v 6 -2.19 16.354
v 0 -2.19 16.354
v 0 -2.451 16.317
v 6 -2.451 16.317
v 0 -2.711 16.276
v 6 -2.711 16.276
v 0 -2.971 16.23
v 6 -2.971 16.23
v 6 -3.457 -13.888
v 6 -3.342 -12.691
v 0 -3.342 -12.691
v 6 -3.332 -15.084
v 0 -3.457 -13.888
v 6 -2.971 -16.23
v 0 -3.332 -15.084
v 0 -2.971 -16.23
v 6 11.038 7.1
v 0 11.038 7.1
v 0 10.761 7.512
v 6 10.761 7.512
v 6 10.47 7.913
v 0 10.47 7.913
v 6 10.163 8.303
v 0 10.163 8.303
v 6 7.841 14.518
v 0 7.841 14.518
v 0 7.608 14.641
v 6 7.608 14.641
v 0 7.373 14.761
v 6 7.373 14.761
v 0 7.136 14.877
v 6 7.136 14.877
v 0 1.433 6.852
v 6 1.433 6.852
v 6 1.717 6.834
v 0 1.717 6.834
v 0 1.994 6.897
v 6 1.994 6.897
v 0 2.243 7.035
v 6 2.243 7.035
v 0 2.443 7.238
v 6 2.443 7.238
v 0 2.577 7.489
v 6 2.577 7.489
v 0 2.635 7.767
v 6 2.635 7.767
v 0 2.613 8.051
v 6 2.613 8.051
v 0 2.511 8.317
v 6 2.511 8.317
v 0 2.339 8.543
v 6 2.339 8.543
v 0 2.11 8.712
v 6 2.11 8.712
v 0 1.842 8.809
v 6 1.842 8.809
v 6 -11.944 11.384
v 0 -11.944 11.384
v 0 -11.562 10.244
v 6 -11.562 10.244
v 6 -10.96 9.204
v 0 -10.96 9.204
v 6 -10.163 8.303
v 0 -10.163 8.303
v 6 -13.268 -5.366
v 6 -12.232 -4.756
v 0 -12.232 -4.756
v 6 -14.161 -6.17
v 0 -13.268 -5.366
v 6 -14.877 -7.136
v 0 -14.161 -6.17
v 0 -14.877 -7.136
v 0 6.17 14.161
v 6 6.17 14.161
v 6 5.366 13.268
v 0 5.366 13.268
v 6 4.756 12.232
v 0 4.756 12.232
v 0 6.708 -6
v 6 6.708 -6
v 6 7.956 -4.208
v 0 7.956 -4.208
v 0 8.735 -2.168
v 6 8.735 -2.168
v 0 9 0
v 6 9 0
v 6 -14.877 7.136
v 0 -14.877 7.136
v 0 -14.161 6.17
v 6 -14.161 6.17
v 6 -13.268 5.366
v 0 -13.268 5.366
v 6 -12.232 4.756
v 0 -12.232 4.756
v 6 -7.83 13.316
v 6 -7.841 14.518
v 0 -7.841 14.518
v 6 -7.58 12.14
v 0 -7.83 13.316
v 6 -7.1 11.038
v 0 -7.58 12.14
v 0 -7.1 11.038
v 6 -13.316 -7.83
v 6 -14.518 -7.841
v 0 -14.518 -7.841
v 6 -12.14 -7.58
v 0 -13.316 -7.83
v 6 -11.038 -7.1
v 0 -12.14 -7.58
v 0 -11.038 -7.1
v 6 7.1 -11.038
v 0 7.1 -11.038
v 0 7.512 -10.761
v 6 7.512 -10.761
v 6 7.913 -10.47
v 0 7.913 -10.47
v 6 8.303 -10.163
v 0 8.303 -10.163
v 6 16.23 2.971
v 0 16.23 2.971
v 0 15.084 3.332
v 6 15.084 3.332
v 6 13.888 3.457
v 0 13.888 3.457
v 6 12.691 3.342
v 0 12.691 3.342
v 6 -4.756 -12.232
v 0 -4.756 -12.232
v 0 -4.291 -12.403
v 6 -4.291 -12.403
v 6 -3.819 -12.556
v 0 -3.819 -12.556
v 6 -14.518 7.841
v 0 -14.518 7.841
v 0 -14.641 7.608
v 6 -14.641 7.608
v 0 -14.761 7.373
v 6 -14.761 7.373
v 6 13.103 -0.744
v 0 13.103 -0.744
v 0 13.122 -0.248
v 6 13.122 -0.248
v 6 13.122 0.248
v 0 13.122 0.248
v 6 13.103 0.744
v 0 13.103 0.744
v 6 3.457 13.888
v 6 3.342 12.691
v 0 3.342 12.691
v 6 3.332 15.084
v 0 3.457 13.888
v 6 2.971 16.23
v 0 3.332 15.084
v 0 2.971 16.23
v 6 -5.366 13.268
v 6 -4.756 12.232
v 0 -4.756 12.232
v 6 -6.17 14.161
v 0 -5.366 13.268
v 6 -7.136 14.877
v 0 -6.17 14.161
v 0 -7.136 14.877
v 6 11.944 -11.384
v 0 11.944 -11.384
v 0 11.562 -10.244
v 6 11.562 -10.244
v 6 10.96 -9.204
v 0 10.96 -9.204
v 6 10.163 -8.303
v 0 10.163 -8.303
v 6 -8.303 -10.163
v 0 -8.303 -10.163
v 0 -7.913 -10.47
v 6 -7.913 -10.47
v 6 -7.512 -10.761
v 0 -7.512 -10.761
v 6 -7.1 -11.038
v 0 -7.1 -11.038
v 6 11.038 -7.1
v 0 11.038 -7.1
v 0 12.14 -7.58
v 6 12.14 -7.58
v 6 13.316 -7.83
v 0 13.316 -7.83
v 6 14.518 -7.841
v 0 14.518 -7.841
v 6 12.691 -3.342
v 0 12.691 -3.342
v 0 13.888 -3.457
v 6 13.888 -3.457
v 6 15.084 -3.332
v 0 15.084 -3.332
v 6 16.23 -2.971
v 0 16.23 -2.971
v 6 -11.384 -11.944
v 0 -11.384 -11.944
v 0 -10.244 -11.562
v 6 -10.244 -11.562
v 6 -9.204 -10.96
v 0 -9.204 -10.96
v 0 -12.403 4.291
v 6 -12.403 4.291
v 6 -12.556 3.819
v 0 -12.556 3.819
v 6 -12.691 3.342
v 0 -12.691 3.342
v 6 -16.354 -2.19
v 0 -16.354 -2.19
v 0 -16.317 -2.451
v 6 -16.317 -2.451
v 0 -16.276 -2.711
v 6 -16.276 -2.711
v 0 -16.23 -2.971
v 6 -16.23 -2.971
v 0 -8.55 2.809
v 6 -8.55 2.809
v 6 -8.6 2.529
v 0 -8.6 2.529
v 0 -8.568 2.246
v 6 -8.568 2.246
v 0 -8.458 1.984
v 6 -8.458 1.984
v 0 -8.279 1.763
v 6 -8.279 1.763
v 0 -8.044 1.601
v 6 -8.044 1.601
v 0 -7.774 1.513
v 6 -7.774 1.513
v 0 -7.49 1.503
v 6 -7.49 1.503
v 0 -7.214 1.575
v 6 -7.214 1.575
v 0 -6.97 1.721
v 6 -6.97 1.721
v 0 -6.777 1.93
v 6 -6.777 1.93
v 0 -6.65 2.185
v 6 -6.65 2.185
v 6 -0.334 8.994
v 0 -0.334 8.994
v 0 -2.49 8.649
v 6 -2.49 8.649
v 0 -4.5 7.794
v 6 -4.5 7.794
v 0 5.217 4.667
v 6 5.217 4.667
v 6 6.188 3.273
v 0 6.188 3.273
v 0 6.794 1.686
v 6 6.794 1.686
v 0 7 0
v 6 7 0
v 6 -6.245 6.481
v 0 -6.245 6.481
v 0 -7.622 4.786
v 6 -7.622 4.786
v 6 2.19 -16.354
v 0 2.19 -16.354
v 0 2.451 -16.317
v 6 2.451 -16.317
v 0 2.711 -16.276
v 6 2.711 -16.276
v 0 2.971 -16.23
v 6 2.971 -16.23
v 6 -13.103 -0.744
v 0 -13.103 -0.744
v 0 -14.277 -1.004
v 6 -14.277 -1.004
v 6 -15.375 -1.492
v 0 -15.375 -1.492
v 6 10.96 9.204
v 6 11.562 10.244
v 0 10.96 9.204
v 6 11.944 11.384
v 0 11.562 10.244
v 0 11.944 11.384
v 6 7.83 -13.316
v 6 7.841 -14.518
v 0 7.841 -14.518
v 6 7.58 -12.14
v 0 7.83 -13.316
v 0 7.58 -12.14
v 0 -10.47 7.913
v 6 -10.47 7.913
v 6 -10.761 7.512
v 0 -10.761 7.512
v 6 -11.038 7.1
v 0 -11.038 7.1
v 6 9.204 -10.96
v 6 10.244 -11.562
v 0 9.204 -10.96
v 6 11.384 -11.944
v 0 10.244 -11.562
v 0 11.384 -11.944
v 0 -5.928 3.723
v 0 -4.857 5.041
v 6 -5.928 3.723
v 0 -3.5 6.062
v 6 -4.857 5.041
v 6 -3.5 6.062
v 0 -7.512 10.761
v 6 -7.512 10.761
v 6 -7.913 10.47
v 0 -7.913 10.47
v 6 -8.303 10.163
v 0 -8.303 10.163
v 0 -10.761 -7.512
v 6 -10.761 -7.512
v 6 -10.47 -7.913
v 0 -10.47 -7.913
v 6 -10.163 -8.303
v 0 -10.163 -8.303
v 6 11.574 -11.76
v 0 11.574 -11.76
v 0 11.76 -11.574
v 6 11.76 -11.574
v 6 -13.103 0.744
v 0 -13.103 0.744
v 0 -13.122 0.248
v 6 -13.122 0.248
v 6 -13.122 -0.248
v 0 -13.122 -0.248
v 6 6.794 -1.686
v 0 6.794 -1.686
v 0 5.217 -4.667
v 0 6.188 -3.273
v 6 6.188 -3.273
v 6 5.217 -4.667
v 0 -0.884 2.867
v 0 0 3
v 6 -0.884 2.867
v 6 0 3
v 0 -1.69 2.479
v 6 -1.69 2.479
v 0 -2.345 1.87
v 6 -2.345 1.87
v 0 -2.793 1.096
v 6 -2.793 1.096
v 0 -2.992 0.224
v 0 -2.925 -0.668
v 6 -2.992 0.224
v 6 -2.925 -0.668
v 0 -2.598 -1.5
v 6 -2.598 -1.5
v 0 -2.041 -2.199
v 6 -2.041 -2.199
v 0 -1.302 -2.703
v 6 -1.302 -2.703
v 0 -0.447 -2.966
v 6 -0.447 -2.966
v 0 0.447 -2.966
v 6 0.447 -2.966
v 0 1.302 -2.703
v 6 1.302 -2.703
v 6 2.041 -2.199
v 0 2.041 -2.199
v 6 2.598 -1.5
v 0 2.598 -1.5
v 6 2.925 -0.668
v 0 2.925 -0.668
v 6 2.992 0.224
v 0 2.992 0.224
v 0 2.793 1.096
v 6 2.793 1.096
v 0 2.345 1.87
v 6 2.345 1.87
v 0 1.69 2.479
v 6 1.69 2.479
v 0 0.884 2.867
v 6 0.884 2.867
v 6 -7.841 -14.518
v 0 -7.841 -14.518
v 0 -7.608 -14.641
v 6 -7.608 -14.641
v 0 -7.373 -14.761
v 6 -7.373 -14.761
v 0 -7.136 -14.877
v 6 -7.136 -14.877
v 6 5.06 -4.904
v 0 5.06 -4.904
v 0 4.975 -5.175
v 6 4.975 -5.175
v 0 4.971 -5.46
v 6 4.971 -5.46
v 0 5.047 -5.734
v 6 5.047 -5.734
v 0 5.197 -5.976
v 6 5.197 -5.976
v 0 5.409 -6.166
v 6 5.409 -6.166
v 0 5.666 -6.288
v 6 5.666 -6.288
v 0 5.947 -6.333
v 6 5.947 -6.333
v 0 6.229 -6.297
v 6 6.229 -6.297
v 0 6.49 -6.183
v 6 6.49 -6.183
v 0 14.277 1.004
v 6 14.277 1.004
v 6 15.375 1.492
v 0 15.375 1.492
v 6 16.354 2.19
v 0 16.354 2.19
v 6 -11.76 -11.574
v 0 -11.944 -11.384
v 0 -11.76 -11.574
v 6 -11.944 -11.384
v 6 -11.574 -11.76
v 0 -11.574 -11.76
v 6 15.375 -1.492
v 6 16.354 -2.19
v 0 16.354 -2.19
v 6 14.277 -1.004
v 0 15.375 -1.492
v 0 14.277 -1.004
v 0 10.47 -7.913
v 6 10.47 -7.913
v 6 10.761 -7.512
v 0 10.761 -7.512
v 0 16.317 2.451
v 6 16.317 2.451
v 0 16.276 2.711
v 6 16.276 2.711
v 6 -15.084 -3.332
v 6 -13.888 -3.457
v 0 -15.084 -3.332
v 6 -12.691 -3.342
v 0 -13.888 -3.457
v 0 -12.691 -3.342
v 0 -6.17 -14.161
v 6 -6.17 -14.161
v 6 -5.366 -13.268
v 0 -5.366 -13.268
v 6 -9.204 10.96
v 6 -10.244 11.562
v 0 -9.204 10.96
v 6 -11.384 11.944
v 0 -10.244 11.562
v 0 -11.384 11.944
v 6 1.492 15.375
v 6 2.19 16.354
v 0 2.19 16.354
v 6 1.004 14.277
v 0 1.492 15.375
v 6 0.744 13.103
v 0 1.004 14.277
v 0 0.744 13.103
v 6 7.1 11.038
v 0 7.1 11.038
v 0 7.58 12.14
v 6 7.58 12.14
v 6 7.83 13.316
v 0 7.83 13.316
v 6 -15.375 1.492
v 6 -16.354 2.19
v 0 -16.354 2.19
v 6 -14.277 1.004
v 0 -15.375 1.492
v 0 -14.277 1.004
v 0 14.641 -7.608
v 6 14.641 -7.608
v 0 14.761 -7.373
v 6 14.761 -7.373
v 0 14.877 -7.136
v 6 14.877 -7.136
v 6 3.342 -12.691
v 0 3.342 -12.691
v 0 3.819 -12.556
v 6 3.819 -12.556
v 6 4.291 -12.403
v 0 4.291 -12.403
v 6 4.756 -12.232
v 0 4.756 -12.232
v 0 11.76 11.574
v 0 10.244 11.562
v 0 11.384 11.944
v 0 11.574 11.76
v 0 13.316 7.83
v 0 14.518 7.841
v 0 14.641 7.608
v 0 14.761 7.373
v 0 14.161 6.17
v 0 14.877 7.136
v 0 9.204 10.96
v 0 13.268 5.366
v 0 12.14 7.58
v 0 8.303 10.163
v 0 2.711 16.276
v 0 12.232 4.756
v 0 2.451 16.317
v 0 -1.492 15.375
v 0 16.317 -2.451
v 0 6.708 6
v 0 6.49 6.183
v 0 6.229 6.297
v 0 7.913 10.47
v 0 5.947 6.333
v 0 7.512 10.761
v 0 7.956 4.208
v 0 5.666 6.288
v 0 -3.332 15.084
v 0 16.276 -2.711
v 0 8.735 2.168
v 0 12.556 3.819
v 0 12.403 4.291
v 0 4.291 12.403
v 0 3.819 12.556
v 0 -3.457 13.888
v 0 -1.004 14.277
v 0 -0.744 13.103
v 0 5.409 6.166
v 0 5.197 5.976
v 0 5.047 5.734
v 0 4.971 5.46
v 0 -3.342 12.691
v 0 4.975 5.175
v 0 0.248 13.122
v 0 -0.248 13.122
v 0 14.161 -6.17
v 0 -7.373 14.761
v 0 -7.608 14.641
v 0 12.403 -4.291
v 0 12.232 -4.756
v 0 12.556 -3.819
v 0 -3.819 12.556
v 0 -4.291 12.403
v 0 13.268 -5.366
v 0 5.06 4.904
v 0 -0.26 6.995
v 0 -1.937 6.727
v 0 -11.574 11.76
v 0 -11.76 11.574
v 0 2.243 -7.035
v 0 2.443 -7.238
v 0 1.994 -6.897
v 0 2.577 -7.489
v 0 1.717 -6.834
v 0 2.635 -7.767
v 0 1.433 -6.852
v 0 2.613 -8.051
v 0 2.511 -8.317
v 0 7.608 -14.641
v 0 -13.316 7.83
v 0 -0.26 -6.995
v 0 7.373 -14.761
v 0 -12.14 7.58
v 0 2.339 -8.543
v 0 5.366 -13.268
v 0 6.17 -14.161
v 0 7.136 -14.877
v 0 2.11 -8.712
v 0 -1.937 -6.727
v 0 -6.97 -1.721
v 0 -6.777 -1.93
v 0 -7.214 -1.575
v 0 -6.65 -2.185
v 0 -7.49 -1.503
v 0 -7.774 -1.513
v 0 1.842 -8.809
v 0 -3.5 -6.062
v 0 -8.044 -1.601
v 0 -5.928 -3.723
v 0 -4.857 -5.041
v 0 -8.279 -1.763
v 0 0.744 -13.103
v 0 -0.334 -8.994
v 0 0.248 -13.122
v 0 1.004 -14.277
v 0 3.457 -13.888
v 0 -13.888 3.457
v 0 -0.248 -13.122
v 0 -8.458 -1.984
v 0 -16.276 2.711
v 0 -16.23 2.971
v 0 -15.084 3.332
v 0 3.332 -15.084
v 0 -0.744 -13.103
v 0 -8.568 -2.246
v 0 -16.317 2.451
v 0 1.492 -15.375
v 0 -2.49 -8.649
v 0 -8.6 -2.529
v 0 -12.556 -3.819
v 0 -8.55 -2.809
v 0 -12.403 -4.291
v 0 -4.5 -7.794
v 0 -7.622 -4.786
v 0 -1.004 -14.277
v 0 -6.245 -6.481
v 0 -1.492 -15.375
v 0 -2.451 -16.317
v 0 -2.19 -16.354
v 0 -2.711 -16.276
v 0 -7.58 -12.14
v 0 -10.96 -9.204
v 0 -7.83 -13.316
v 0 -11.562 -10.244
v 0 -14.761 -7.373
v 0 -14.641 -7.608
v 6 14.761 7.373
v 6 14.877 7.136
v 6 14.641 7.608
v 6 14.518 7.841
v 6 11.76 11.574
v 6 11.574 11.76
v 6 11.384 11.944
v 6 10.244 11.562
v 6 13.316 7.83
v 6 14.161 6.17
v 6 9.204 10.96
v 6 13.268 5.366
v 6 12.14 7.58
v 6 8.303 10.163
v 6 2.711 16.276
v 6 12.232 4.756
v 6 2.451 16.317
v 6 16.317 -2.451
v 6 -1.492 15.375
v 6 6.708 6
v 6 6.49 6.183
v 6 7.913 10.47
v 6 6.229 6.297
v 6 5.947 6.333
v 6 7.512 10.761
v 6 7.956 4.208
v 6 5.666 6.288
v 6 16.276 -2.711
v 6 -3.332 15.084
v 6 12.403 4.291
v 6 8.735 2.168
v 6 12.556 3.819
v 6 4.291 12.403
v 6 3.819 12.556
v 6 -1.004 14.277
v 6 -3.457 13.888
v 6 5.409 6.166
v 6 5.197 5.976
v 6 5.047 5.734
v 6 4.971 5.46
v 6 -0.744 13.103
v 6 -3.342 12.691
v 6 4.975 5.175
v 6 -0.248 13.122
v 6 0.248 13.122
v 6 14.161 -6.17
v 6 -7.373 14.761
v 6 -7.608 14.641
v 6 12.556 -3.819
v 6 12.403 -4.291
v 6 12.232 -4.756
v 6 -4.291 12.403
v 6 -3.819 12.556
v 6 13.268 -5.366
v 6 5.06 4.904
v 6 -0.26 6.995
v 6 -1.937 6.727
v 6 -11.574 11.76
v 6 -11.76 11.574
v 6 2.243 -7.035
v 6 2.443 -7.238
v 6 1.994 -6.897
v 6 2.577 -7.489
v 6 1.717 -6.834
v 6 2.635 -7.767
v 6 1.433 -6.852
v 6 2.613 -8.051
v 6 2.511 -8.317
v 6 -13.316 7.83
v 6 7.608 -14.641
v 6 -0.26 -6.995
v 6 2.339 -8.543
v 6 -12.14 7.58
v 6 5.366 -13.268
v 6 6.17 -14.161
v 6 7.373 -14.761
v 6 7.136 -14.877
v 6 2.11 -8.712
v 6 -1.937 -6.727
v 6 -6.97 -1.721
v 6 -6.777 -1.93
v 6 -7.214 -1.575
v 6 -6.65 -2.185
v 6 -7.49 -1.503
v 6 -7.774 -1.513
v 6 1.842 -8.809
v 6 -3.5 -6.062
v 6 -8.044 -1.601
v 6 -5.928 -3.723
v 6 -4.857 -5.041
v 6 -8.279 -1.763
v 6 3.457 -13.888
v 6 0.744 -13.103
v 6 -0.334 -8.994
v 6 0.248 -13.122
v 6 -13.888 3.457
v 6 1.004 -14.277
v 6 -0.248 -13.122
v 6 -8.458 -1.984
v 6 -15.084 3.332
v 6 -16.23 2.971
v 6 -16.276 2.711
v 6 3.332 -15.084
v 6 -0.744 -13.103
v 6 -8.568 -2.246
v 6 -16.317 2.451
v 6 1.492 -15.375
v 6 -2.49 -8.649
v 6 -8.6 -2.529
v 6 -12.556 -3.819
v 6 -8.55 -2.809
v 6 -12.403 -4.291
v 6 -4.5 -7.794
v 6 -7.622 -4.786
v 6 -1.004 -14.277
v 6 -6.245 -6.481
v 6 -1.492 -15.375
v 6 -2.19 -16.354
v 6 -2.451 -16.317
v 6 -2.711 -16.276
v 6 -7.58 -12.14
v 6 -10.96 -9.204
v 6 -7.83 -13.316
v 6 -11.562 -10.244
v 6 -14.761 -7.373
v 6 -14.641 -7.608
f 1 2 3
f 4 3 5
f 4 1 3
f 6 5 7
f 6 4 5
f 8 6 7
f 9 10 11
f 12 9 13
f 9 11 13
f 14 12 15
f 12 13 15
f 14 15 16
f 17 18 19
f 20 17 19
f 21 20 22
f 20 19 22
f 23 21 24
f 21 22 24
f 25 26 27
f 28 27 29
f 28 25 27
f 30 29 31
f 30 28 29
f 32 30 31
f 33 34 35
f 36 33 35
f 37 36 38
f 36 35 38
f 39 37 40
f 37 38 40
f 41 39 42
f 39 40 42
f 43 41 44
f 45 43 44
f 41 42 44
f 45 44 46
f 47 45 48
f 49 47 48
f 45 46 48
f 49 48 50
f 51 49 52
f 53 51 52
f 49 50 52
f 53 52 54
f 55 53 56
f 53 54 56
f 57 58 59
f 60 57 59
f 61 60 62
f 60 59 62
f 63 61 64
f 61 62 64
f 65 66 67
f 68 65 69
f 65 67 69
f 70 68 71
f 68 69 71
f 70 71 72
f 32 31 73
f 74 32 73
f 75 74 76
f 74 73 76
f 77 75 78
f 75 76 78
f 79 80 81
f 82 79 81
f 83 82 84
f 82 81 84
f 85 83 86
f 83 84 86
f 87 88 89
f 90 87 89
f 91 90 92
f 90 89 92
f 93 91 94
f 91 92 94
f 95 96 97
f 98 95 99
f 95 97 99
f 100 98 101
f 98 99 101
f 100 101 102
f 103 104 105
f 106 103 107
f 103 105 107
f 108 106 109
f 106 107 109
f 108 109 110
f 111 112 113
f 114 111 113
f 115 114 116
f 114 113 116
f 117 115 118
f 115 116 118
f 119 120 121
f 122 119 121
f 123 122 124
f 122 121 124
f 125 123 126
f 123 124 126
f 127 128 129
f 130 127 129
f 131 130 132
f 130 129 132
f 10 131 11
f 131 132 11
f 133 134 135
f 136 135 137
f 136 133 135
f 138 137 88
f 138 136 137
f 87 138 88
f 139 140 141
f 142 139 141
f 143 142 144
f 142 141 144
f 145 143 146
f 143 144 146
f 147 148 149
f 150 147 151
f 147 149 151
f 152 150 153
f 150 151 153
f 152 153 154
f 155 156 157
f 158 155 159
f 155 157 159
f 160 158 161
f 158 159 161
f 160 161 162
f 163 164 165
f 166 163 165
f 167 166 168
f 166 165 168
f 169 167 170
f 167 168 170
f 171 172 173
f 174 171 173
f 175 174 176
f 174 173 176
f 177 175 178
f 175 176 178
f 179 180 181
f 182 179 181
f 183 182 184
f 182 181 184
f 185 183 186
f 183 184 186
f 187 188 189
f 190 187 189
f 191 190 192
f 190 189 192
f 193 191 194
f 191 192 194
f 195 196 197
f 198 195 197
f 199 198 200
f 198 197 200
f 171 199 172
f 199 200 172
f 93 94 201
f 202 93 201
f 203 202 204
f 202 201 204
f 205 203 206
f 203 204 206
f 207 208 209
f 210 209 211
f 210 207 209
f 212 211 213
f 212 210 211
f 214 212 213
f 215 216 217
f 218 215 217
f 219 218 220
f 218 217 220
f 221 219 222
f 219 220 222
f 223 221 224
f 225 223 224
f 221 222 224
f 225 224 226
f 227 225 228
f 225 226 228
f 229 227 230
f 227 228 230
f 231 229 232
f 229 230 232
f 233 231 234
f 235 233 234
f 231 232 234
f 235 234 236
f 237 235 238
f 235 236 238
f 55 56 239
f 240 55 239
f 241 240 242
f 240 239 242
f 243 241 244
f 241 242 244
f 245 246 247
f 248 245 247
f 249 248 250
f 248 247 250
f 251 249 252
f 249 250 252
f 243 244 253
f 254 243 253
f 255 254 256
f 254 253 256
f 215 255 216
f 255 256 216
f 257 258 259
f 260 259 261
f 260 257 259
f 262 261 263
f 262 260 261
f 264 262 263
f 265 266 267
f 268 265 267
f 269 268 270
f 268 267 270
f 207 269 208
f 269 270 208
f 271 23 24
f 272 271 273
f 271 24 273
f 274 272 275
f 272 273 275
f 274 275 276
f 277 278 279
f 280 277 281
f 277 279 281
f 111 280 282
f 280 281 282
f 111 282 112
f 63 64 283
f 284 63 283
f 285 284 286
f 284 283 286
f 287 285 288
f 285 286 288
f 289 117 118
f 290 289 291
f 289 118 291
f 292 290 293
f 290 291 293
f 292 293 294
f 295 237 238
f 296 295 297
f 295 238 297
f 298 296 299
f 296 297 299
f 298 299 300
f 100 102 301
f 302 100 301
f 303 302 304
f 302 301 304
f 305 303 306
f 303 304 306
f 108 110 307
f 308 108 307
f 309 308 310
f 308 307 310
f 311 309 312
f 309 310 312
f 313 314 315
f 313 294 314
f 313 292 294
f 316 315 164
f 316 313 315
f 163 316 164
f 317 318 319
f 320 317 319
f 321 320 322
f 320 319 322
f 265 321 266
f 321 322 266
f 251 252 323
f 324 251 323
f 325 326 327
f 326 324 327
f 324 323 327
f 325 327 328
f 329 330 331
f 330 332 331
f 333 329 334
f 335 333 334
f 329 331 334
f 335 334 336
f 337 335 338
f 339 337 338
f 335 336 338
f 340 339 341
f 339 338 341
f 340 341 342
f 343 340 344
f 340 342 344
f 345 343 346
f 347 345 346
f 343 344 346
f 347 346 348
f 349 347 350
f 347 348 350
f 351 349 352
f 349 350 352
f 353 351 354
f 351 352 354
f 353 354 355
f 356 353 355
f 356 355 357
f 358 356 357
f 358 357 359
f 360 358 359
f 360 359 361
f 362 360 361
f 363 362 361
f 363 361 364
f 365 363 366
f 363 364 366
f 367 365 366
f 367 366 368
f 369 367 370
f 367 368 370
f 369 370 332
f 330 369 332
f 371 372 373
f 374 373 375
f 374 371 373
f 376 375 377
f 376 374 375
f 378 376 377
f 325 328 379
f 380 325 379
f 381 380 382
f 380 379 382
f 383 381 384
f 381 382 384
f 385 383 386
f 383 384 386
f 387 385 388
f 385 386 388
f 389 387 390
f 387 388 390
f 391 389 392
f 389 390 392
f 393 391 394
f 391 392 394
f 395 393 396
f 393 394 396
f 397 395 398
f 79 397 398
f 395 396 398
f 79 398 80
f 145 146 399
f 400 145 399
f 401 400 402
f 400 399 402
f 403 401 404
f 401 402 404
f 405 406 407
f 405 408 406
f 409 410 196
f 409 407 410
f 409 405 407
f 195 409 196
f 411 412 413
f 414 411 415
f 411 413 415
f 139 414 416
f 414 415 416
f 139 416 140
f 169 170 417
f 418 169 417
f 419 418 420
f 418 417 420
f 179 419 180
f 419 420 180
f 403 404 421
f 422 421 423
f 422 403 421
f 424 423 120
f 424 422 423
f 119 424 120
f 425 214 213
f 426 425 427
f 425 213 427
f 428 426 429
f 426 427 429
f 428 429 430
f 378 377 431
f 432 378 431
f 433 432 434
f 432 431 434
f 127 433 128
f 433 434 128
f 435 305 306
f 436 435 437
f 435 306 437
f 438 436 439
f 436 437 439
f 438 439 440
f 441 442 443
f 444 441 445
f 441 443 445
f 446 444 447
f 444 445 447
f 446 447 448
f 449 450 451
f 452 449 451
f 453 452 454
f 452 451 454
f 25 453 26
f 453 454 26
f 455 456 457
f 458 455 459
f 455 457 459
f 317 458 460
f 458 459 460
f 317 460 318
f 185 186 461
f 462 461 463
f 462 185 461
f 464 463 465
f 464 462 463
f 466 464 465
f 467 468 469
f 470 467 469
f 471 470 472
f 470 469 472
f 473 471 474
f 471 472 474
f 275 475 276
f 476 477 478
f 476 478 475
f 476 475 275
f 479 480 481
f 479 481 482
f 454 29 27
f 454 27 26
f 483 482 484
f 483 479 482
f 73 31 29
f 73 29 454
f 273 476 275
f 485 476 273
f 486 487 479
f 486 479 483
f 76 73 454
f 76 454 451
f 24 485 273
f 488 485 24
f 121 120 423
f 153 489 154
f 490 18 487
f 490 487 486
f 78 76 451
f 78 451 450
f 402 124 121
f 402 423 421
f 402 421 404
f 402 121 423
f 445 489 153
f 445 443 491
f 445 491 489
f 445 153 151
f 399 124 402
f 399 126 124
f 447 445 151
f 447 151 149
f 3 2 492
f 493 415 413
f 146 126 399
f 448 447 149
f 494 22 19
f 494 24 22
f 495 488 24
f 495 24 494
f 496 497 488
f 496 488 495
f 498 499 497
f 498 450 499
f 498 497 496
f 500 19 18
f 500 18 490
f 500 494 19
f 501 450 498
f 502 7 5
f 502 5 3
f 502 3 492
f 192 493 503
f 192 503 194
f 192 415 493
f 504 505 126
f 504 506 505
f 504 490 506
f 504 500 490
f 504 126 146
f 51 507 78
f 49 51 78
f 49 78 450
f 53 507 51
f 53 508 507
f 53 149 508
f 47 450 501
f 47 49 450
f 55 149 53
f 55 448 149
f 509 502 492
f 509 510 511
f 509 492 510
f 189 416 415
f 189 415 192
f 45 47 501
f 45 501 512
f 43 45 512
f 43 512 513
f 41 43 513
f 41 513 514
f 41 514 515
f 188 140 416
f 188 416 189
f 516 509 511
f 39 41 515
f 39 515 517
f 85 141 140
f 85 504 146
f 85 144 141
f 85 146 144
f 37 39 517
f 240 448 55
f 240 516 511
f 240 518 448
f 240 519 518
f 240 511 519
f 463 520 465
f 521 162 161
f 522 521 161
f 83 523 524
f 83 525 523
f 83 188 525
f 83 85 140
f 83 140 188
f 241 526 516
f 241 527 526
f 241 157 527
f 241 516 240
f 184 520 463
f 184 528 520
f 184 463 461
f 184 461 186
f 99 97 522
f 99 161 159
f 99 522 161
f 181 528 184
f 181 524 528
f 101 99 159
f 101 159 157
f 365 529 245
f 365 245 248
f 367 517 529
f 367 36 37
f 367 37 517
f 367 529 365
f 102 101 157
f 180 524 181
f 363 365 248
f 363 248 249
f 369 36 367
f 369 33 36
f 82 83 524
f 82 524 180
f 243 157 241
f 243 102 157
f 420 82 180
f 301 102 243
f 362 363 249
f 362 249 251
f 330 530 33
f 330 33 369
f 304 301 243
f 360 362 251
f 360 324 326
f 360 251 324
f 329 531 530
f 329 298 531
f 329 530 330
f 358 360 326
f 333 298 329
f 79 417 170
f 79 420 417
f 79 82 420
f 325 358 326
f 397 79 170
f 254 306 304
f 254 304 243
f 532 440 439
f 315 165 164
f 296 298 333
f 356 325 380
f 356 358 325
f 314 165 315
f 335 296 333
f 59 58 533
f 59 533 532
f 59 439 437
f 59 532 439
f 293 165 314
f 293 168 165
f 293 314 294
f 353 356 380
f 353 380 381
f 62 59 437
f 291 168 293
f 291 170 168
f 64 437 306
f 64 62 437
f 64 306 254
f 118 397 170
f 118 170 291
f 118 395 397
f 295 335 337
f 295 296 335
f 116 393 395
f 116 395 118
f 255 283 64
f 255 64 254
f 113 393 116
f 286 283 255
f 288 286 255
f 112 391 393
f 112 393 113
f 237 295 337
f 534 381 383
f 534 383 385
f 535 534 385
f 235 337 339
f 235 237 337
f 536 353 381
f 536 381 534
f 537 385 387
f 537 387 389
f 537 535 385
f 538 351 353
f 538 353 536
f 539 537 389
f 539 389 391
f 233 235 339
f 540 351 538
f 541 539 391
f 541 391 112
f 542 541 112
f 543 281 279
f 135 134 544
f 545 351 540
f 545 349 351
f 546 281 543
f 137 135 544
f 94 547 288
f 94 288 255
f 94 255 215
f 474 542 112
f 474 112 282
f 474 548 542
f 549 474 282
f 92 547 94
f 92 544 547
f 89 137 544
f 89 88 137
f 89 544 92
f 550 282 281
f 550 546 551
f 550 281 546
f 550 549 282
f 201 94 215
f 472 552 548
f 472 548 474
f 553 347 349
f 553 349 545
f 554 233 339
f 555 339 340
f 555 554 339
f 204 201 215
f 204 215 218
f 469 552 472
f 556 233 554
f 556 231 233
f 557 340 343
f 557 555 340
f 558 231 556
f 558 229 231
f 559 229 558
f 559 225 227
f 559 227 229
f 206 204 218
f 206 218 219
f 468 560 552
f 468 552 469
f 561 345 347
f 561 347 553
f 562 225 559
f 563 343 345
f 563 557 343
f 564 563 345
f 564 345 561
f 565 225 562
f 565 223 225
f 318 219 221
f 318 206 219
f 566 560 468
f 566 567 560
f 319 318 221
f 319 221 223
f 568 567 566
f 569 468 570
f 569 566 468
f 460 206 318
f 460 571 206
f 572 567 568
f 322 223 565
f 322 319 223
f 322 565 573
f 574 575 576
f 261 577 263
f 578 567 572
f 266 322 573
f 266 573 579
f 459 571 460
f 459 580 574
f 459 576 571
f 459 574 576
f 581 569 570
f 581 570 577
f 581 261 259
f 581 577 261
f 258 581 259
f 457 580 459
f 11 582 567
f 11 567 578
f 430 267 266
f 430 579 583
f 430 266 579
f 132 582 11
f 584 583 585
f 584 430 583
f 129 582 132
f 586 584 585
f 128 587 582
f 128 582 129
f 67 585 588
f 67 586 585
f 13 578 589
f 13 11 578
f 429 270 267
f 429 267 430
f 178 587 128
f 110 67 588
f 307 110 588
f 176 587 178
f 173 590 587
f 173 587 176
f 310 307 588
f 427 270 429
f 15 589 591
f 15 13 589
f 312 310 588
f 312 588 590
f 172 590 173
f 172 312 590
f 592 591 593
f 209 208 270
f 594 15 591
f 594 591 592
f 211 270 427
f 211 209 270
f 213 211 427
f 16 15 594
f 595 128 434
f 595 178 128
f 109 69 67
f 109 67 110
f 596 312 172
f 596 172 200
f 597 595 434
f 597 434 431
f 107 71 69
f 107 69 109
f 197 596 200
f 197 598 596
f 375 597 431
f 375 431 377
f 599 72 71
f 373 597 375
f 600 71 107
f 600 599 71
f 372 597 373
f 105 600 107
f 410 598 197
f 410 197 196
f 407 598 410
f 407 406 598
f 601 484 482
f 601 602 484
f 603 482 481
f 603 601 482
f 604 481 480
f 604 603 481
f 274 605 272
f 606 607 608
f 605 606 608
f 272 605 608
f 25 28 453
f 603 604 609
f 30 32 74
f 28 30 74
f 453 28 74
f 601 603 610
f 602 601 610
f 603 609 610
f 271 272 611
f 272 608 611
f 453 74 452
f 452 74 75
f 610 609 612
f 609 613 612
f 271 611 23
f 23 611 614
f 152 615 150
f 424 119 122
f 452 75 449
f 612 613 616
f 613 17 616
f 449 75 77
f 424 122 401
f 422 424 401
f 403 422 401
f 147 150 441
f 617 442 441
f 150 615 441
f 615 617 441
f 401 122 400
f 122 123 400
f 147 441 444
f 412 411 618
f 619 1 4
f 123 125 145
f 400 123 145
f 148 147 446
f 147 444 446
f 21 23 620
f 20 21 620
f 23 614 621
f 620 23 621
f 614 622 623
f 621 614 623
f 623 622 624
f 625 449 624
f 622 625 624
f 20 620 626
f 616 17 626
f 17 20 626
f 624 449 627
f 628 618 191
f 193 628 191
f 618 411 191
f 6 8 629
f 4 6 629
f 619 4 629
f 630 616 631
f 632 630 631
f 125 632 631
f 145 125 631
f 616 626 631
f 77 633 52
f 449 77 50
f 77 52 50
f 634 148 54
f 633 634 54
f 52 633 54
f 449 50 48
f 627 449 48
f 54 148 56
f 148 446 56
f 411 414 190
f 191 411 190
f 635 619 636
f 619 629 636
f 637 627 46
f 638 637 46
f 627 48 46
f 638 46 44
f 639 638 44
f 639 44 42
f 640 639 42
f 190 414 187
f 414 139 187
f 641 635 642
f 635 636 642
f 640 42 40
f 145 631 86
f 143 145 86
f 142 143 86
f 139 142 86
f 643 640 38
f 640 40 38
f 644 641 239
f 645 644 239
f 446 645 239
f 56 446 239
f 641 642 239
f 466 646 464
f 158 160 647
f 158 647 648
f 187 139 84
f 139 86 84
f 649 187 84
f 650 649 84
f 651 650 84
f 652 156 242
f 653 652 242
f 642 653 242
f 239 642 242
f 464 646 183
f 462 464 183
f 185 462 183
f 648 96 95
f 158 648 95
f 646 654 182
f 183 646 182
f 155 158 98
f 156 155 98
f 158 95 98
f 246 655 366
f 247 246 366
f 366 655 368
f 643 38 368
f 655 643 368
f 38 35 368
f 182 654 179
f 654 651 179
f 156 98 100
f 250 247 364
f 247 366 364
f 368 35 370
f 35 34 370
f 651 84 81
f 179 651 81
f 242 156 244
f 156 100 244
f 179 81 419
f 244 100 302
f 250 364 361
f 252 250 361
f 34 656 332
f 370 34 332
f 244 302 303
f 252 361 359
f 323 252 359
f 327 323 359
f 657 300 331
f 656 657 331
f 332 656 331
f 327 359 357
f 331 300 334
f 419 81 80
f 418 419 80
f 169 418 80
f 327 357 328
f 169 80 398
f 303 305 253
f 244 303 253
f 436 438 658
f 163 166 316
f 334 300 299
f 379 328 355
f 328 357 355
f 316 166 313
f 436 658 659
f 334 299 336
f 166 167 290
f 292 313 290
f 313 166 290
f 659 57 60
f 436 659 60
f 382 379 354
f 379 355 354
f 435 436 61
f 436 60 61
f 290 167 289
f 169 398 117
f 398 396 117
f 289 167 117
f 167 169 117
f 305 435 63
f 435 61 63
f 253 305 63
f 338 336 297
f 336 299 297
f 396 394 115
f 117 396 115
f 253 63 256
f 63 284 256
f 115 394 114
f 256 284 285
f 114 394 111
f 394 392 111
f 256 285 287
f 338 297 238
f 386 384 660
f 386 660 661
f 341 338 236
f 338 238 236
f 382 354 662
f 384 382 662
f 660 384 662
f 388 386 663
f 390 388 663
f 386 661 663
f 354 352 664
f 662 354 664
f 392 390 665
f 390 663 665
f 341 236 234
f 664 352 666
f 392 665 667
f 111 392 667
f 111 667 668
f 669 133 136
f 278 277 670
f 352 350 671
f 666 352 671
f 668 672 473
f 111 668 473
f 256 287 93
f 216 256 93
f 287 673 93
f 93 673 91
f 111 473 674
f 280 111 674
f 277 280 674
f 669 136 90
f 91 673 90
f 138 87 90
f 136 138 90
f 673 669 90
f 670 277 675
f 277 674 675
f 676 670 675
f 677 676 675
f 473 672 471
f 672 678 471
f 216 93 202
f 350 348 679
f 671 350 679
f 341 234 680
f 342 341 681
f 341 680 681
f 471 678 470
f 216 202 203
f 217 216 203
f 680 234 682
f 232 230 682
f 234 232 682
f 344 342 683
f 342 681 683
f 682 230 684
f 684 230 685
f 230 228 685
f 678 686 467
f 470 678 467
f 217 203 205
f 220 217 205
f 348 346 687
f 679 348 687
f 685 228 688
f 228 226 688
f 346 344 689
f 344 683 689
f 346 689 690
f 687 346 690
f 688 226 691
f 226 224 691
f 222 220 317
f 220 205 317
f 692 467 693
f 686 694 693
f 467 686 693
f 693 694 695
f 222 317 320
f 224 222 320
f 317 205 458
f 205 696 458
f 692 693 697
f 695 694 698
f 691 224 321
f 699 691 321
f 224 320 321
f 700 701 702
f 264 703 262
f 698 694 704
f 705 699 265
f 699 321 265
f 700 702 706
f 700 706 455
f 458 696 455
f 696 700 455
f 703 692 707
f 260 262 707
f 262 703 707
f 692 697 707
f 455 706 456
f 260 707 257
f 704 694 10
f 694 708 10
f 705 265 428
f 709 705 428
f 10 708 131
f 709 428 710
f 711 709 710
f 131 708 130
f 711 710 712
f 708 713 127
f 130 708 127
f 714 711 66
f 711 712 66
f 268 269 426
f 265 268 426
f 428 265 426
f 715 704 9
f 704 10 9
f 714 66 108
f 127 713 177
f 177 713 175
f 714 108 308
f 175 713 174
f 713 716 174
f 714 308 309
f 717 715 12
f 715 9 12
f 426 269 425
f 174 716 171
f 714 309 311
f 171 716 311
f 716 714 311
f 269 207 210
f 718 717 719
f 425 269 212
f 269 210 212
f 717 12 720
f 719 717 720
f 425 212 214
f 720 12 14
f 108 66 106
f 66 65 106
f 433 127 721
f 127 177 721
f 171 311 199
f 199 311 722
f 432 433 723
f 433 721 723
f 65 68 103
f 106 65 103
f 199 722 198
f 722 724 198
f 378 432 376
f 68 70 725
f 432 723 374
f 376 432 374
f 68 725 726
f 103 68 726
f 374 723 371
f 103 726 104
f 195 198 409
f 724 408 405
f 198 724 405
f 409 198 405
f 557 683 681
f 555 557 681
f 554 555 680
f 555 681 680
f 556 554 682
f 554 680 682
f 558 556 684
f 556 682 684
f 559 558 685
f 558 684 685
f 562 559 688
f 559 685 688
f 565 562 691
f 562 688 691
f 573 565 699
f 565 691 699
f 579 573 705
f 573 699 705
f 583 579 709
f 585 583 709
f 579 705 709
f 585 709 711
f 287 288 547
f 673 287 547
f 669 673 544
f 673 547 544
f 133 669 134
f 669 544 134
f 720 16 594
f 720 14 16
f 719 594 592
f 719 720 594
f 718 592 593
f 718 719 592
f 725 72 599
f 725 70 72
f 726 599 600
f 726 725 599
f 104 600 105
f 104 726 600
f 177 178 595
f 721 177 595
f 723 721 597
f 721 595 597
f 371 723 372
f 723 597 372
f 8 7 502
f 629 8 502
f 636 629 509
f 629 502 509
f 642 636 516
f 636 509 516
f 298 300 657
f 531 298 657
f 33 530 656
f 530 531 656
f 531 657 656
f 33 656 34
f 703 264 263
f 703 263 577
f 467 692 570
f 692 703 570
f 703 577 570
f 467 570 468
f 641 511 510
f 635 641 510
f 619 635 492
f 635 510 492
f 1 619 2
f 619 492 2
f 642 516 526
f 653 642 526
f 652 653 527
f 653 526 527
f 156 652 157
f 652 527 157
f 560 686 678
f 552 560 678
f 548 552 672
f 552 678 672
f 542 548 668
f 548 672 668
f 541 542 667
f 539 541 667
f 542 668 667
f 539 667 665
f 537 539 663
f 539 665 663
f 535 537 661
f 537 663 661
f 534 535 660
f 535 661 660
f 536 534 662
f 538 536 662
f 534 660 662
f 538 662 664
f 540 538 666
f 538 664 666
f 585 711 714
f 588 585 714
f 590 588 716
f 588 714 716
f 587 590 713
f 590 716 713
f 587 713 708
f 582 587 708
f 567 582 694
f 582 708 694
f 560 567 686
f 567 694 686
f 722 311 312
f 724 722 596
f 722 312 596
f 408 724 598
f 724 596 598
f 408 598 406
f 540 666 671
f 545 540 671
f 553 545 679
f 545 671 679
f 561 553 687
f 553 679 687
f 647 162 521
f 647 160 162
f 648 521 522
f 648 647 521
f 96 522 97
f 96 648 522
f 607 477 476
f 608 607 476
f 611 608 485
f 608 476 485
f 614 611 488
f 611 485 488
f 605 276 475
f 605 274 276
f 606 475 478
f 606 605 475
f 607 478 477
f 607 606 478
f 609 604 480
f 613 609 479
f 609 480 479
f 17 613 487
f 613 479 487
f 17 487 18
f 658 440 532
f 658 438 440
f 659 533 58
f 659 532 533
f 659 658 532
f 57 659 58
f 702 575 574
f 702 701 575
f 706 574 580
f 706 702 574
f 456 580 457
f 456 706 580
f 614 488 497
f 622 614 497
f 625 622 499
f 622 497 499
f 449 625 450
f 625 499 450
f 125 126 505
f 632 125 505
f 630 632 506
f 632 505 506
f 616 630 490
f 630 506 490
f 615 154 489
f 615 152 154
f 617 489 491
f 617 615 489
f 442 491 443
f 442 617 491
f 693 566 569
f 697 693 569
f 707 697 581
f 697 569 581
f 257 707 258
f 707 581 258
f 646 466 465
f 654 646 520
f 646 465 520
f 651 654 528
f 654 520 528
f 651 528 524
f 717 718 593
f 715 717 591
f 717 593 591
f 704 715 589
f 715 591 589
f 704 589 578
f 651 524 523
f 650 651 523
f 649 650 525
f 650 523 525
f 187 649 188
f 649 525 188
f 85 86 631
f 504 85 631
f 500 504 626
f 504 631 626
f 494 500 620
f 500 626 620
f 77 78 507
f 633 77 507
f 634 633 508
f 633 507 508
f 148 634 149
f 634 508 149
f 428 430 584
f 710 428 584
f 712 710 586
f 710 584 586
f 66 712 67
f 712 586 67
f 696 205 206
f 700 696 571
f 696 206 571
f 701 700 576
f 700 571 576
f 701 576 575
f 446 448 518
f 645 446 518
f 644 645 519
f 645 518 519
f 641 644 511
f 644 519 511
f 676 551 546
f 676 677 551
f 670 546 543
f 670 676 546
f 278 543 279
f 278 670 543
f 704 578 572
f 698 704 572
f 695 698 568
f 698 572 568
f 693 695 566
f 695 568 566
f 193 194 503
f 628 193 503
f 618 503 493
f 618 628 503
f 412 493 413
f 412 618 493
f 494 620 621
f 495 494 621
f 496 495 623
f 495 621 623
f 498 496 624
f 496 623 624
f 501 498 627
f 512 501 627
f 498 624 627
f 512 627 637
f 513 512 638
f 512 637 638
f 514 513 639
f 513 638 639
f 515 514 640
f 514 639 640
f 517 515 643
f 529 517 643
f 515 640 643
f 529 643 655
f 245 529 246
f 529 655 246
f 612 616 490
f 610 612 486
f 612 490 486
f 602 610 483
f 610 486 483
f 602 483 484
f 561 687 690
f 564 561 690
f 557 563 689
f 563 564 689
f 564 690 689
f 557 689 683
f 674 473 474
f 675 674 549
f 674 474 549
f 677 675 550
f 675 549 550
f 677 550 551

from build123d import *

# Parameters (mm, degrees)
BASPROSKE_W        = 6
BASPROSKE_H        = 16.5
TOOTHCUT_DEPTH     = 25.093567606
TEETHCUTS_COUNT    = 20
TEETHCUTS_ANGLE    = 342
BORSKE_R           = 3
BORE_DEPTH         = 50.0000508
SKETCH1_R          = 1
CUT_EXTRUDE1_DEPTH = 10
CIRPATTERN1_COUNT  = 3


with BuildPart() as part:
    # BasProSke → Base-Revolve (revolve)
    with BuildSketch(Plane(origin=(0, 0, 0), x_dir=(1, 0, 0), z_dir=(0, 1, 0)), mode=Mode.PRIVATE) as base_revolve_sk:
        with Locations((3, 8.25)):
            Rectangle(BASPROSKE_W, BASPROSKE_H)
    revolve(base_revolve_sk.sketch.rotate(Axis((-10, 0, 0), (1, 0, 0)), 180), axis=Axis((-10, 0, 0), (1, 0, 0)))

    # TooCutSke → ToothCut (cut, through all)
    with BuildSketch(Plane(origin=(0, 0, 0), x_dir=(0, 0, -1), z_dir=(1, 0, 0))):
        with BuildLine():
            ThreePointArc((0.74381438, 13.102904875), (0, 13.124), (-0.74381438, 13.102904875))
            ThreePointArc((-0.74381438, 13.102904875), (-1.226473103, 14.852072512), (-2.209965745, 16.376962373))
            ThreePointArc((-2.209965745, 16.376962373), (0, 16.5254), (2.209965745, 16.376962373))
            ThreePointArc((2.209965745, 16.376962373), (1.226473103, 14.852072512), (0.74381438, 13.102904875))
        make_face()
    toothcut = extrude(amount=TOOTHCUT_DEPTH, mode=Mode.SUBTRACT)

    # TeethCuts: ToothCut ×20 about axis
    teethcuts_axis = Axis((-10, 0, 0), (1, 0, 0))
    for i in range(1, TEETHCUTS_COUNT):
        add(toothcut.rotate(teethcuts_axis, i * TEETHCUTS_ANGLE / (TEETHCUTS_COUNT - 1)), mode=Mode.SUBTRACT)

    # BorSke → Bore (cut, symmetric)
    with BuildSketch(Plane(origin=(0, 0, 0), x_dir=(0, 0, -1), z_dir=(1, 0, 0))):
        with Locations(Location((0, 0, 0), (0, 0, 180))):
            Circle(BORSKE_R)
    extrude(amount=BORE_DEPTH, both=True, mode=Mode.SUBTRACT)

    # Sketch1 → Cut-Extrude1 (cut)
    with BuildSketch(Plane(origin=(6, 0, 0), x_dir=(0, 0, -1), z_dir=(1, 0, 0))):
        with BuildLine():
            ThreePointArc((6, 6.708203932), (3.211398808, 8.407551231), (0, 9))
            ThreePointArc((0, 9), (-3.211398808, 8.407551231), (-6, 6.708203932))
            ThreePointArc((-6, 6.708203932), (-4.925085043, 6.875718869), (-4.333333333, 5.96284794))
            ThreePointArc((-4.333333333, 5.96284794), (-4.420462404, 5.55459965), (-4.666666667, 5.217491947))
            ThreePointArc((-4.666666667, 5.217491947), (-2.497754628, 6.539206513), (0, 7))
            ThreePointArc((0, 7), (2.497754628, 6.539206513), (4.666666667, 5.217491947))
            ThreePointArc((4.666666667, 5.217491947), (4.587977341, 6.629514607), (6, 6.708203932))
        make_face()
        with Locations((-5.333333333, 5.96284794)):
            Circle(SKETCH1_R)
        with Locations((5.333333333, 5.96284794)):
            Circle(SKETCH1_R)
    cut_extrude1 = extrude(amount=-CUT_EXTRUDE1_DEPTH, mode=Mode.SUBTRACT)

    # CirPattern1: Cut-Extrude1 ×3 about axis
    cirpattern1_axis = Axis((0, 0, 0), (1, 0, 0))
    for i in range(1, CIRPATTERN1_COUNT):
        add(cut_extrude1.rotate(cirpattern1_axis, i * 360 / CIRPATTERN1_COUNT), mode=Mode.SUBTRACT)


solid = part.part
